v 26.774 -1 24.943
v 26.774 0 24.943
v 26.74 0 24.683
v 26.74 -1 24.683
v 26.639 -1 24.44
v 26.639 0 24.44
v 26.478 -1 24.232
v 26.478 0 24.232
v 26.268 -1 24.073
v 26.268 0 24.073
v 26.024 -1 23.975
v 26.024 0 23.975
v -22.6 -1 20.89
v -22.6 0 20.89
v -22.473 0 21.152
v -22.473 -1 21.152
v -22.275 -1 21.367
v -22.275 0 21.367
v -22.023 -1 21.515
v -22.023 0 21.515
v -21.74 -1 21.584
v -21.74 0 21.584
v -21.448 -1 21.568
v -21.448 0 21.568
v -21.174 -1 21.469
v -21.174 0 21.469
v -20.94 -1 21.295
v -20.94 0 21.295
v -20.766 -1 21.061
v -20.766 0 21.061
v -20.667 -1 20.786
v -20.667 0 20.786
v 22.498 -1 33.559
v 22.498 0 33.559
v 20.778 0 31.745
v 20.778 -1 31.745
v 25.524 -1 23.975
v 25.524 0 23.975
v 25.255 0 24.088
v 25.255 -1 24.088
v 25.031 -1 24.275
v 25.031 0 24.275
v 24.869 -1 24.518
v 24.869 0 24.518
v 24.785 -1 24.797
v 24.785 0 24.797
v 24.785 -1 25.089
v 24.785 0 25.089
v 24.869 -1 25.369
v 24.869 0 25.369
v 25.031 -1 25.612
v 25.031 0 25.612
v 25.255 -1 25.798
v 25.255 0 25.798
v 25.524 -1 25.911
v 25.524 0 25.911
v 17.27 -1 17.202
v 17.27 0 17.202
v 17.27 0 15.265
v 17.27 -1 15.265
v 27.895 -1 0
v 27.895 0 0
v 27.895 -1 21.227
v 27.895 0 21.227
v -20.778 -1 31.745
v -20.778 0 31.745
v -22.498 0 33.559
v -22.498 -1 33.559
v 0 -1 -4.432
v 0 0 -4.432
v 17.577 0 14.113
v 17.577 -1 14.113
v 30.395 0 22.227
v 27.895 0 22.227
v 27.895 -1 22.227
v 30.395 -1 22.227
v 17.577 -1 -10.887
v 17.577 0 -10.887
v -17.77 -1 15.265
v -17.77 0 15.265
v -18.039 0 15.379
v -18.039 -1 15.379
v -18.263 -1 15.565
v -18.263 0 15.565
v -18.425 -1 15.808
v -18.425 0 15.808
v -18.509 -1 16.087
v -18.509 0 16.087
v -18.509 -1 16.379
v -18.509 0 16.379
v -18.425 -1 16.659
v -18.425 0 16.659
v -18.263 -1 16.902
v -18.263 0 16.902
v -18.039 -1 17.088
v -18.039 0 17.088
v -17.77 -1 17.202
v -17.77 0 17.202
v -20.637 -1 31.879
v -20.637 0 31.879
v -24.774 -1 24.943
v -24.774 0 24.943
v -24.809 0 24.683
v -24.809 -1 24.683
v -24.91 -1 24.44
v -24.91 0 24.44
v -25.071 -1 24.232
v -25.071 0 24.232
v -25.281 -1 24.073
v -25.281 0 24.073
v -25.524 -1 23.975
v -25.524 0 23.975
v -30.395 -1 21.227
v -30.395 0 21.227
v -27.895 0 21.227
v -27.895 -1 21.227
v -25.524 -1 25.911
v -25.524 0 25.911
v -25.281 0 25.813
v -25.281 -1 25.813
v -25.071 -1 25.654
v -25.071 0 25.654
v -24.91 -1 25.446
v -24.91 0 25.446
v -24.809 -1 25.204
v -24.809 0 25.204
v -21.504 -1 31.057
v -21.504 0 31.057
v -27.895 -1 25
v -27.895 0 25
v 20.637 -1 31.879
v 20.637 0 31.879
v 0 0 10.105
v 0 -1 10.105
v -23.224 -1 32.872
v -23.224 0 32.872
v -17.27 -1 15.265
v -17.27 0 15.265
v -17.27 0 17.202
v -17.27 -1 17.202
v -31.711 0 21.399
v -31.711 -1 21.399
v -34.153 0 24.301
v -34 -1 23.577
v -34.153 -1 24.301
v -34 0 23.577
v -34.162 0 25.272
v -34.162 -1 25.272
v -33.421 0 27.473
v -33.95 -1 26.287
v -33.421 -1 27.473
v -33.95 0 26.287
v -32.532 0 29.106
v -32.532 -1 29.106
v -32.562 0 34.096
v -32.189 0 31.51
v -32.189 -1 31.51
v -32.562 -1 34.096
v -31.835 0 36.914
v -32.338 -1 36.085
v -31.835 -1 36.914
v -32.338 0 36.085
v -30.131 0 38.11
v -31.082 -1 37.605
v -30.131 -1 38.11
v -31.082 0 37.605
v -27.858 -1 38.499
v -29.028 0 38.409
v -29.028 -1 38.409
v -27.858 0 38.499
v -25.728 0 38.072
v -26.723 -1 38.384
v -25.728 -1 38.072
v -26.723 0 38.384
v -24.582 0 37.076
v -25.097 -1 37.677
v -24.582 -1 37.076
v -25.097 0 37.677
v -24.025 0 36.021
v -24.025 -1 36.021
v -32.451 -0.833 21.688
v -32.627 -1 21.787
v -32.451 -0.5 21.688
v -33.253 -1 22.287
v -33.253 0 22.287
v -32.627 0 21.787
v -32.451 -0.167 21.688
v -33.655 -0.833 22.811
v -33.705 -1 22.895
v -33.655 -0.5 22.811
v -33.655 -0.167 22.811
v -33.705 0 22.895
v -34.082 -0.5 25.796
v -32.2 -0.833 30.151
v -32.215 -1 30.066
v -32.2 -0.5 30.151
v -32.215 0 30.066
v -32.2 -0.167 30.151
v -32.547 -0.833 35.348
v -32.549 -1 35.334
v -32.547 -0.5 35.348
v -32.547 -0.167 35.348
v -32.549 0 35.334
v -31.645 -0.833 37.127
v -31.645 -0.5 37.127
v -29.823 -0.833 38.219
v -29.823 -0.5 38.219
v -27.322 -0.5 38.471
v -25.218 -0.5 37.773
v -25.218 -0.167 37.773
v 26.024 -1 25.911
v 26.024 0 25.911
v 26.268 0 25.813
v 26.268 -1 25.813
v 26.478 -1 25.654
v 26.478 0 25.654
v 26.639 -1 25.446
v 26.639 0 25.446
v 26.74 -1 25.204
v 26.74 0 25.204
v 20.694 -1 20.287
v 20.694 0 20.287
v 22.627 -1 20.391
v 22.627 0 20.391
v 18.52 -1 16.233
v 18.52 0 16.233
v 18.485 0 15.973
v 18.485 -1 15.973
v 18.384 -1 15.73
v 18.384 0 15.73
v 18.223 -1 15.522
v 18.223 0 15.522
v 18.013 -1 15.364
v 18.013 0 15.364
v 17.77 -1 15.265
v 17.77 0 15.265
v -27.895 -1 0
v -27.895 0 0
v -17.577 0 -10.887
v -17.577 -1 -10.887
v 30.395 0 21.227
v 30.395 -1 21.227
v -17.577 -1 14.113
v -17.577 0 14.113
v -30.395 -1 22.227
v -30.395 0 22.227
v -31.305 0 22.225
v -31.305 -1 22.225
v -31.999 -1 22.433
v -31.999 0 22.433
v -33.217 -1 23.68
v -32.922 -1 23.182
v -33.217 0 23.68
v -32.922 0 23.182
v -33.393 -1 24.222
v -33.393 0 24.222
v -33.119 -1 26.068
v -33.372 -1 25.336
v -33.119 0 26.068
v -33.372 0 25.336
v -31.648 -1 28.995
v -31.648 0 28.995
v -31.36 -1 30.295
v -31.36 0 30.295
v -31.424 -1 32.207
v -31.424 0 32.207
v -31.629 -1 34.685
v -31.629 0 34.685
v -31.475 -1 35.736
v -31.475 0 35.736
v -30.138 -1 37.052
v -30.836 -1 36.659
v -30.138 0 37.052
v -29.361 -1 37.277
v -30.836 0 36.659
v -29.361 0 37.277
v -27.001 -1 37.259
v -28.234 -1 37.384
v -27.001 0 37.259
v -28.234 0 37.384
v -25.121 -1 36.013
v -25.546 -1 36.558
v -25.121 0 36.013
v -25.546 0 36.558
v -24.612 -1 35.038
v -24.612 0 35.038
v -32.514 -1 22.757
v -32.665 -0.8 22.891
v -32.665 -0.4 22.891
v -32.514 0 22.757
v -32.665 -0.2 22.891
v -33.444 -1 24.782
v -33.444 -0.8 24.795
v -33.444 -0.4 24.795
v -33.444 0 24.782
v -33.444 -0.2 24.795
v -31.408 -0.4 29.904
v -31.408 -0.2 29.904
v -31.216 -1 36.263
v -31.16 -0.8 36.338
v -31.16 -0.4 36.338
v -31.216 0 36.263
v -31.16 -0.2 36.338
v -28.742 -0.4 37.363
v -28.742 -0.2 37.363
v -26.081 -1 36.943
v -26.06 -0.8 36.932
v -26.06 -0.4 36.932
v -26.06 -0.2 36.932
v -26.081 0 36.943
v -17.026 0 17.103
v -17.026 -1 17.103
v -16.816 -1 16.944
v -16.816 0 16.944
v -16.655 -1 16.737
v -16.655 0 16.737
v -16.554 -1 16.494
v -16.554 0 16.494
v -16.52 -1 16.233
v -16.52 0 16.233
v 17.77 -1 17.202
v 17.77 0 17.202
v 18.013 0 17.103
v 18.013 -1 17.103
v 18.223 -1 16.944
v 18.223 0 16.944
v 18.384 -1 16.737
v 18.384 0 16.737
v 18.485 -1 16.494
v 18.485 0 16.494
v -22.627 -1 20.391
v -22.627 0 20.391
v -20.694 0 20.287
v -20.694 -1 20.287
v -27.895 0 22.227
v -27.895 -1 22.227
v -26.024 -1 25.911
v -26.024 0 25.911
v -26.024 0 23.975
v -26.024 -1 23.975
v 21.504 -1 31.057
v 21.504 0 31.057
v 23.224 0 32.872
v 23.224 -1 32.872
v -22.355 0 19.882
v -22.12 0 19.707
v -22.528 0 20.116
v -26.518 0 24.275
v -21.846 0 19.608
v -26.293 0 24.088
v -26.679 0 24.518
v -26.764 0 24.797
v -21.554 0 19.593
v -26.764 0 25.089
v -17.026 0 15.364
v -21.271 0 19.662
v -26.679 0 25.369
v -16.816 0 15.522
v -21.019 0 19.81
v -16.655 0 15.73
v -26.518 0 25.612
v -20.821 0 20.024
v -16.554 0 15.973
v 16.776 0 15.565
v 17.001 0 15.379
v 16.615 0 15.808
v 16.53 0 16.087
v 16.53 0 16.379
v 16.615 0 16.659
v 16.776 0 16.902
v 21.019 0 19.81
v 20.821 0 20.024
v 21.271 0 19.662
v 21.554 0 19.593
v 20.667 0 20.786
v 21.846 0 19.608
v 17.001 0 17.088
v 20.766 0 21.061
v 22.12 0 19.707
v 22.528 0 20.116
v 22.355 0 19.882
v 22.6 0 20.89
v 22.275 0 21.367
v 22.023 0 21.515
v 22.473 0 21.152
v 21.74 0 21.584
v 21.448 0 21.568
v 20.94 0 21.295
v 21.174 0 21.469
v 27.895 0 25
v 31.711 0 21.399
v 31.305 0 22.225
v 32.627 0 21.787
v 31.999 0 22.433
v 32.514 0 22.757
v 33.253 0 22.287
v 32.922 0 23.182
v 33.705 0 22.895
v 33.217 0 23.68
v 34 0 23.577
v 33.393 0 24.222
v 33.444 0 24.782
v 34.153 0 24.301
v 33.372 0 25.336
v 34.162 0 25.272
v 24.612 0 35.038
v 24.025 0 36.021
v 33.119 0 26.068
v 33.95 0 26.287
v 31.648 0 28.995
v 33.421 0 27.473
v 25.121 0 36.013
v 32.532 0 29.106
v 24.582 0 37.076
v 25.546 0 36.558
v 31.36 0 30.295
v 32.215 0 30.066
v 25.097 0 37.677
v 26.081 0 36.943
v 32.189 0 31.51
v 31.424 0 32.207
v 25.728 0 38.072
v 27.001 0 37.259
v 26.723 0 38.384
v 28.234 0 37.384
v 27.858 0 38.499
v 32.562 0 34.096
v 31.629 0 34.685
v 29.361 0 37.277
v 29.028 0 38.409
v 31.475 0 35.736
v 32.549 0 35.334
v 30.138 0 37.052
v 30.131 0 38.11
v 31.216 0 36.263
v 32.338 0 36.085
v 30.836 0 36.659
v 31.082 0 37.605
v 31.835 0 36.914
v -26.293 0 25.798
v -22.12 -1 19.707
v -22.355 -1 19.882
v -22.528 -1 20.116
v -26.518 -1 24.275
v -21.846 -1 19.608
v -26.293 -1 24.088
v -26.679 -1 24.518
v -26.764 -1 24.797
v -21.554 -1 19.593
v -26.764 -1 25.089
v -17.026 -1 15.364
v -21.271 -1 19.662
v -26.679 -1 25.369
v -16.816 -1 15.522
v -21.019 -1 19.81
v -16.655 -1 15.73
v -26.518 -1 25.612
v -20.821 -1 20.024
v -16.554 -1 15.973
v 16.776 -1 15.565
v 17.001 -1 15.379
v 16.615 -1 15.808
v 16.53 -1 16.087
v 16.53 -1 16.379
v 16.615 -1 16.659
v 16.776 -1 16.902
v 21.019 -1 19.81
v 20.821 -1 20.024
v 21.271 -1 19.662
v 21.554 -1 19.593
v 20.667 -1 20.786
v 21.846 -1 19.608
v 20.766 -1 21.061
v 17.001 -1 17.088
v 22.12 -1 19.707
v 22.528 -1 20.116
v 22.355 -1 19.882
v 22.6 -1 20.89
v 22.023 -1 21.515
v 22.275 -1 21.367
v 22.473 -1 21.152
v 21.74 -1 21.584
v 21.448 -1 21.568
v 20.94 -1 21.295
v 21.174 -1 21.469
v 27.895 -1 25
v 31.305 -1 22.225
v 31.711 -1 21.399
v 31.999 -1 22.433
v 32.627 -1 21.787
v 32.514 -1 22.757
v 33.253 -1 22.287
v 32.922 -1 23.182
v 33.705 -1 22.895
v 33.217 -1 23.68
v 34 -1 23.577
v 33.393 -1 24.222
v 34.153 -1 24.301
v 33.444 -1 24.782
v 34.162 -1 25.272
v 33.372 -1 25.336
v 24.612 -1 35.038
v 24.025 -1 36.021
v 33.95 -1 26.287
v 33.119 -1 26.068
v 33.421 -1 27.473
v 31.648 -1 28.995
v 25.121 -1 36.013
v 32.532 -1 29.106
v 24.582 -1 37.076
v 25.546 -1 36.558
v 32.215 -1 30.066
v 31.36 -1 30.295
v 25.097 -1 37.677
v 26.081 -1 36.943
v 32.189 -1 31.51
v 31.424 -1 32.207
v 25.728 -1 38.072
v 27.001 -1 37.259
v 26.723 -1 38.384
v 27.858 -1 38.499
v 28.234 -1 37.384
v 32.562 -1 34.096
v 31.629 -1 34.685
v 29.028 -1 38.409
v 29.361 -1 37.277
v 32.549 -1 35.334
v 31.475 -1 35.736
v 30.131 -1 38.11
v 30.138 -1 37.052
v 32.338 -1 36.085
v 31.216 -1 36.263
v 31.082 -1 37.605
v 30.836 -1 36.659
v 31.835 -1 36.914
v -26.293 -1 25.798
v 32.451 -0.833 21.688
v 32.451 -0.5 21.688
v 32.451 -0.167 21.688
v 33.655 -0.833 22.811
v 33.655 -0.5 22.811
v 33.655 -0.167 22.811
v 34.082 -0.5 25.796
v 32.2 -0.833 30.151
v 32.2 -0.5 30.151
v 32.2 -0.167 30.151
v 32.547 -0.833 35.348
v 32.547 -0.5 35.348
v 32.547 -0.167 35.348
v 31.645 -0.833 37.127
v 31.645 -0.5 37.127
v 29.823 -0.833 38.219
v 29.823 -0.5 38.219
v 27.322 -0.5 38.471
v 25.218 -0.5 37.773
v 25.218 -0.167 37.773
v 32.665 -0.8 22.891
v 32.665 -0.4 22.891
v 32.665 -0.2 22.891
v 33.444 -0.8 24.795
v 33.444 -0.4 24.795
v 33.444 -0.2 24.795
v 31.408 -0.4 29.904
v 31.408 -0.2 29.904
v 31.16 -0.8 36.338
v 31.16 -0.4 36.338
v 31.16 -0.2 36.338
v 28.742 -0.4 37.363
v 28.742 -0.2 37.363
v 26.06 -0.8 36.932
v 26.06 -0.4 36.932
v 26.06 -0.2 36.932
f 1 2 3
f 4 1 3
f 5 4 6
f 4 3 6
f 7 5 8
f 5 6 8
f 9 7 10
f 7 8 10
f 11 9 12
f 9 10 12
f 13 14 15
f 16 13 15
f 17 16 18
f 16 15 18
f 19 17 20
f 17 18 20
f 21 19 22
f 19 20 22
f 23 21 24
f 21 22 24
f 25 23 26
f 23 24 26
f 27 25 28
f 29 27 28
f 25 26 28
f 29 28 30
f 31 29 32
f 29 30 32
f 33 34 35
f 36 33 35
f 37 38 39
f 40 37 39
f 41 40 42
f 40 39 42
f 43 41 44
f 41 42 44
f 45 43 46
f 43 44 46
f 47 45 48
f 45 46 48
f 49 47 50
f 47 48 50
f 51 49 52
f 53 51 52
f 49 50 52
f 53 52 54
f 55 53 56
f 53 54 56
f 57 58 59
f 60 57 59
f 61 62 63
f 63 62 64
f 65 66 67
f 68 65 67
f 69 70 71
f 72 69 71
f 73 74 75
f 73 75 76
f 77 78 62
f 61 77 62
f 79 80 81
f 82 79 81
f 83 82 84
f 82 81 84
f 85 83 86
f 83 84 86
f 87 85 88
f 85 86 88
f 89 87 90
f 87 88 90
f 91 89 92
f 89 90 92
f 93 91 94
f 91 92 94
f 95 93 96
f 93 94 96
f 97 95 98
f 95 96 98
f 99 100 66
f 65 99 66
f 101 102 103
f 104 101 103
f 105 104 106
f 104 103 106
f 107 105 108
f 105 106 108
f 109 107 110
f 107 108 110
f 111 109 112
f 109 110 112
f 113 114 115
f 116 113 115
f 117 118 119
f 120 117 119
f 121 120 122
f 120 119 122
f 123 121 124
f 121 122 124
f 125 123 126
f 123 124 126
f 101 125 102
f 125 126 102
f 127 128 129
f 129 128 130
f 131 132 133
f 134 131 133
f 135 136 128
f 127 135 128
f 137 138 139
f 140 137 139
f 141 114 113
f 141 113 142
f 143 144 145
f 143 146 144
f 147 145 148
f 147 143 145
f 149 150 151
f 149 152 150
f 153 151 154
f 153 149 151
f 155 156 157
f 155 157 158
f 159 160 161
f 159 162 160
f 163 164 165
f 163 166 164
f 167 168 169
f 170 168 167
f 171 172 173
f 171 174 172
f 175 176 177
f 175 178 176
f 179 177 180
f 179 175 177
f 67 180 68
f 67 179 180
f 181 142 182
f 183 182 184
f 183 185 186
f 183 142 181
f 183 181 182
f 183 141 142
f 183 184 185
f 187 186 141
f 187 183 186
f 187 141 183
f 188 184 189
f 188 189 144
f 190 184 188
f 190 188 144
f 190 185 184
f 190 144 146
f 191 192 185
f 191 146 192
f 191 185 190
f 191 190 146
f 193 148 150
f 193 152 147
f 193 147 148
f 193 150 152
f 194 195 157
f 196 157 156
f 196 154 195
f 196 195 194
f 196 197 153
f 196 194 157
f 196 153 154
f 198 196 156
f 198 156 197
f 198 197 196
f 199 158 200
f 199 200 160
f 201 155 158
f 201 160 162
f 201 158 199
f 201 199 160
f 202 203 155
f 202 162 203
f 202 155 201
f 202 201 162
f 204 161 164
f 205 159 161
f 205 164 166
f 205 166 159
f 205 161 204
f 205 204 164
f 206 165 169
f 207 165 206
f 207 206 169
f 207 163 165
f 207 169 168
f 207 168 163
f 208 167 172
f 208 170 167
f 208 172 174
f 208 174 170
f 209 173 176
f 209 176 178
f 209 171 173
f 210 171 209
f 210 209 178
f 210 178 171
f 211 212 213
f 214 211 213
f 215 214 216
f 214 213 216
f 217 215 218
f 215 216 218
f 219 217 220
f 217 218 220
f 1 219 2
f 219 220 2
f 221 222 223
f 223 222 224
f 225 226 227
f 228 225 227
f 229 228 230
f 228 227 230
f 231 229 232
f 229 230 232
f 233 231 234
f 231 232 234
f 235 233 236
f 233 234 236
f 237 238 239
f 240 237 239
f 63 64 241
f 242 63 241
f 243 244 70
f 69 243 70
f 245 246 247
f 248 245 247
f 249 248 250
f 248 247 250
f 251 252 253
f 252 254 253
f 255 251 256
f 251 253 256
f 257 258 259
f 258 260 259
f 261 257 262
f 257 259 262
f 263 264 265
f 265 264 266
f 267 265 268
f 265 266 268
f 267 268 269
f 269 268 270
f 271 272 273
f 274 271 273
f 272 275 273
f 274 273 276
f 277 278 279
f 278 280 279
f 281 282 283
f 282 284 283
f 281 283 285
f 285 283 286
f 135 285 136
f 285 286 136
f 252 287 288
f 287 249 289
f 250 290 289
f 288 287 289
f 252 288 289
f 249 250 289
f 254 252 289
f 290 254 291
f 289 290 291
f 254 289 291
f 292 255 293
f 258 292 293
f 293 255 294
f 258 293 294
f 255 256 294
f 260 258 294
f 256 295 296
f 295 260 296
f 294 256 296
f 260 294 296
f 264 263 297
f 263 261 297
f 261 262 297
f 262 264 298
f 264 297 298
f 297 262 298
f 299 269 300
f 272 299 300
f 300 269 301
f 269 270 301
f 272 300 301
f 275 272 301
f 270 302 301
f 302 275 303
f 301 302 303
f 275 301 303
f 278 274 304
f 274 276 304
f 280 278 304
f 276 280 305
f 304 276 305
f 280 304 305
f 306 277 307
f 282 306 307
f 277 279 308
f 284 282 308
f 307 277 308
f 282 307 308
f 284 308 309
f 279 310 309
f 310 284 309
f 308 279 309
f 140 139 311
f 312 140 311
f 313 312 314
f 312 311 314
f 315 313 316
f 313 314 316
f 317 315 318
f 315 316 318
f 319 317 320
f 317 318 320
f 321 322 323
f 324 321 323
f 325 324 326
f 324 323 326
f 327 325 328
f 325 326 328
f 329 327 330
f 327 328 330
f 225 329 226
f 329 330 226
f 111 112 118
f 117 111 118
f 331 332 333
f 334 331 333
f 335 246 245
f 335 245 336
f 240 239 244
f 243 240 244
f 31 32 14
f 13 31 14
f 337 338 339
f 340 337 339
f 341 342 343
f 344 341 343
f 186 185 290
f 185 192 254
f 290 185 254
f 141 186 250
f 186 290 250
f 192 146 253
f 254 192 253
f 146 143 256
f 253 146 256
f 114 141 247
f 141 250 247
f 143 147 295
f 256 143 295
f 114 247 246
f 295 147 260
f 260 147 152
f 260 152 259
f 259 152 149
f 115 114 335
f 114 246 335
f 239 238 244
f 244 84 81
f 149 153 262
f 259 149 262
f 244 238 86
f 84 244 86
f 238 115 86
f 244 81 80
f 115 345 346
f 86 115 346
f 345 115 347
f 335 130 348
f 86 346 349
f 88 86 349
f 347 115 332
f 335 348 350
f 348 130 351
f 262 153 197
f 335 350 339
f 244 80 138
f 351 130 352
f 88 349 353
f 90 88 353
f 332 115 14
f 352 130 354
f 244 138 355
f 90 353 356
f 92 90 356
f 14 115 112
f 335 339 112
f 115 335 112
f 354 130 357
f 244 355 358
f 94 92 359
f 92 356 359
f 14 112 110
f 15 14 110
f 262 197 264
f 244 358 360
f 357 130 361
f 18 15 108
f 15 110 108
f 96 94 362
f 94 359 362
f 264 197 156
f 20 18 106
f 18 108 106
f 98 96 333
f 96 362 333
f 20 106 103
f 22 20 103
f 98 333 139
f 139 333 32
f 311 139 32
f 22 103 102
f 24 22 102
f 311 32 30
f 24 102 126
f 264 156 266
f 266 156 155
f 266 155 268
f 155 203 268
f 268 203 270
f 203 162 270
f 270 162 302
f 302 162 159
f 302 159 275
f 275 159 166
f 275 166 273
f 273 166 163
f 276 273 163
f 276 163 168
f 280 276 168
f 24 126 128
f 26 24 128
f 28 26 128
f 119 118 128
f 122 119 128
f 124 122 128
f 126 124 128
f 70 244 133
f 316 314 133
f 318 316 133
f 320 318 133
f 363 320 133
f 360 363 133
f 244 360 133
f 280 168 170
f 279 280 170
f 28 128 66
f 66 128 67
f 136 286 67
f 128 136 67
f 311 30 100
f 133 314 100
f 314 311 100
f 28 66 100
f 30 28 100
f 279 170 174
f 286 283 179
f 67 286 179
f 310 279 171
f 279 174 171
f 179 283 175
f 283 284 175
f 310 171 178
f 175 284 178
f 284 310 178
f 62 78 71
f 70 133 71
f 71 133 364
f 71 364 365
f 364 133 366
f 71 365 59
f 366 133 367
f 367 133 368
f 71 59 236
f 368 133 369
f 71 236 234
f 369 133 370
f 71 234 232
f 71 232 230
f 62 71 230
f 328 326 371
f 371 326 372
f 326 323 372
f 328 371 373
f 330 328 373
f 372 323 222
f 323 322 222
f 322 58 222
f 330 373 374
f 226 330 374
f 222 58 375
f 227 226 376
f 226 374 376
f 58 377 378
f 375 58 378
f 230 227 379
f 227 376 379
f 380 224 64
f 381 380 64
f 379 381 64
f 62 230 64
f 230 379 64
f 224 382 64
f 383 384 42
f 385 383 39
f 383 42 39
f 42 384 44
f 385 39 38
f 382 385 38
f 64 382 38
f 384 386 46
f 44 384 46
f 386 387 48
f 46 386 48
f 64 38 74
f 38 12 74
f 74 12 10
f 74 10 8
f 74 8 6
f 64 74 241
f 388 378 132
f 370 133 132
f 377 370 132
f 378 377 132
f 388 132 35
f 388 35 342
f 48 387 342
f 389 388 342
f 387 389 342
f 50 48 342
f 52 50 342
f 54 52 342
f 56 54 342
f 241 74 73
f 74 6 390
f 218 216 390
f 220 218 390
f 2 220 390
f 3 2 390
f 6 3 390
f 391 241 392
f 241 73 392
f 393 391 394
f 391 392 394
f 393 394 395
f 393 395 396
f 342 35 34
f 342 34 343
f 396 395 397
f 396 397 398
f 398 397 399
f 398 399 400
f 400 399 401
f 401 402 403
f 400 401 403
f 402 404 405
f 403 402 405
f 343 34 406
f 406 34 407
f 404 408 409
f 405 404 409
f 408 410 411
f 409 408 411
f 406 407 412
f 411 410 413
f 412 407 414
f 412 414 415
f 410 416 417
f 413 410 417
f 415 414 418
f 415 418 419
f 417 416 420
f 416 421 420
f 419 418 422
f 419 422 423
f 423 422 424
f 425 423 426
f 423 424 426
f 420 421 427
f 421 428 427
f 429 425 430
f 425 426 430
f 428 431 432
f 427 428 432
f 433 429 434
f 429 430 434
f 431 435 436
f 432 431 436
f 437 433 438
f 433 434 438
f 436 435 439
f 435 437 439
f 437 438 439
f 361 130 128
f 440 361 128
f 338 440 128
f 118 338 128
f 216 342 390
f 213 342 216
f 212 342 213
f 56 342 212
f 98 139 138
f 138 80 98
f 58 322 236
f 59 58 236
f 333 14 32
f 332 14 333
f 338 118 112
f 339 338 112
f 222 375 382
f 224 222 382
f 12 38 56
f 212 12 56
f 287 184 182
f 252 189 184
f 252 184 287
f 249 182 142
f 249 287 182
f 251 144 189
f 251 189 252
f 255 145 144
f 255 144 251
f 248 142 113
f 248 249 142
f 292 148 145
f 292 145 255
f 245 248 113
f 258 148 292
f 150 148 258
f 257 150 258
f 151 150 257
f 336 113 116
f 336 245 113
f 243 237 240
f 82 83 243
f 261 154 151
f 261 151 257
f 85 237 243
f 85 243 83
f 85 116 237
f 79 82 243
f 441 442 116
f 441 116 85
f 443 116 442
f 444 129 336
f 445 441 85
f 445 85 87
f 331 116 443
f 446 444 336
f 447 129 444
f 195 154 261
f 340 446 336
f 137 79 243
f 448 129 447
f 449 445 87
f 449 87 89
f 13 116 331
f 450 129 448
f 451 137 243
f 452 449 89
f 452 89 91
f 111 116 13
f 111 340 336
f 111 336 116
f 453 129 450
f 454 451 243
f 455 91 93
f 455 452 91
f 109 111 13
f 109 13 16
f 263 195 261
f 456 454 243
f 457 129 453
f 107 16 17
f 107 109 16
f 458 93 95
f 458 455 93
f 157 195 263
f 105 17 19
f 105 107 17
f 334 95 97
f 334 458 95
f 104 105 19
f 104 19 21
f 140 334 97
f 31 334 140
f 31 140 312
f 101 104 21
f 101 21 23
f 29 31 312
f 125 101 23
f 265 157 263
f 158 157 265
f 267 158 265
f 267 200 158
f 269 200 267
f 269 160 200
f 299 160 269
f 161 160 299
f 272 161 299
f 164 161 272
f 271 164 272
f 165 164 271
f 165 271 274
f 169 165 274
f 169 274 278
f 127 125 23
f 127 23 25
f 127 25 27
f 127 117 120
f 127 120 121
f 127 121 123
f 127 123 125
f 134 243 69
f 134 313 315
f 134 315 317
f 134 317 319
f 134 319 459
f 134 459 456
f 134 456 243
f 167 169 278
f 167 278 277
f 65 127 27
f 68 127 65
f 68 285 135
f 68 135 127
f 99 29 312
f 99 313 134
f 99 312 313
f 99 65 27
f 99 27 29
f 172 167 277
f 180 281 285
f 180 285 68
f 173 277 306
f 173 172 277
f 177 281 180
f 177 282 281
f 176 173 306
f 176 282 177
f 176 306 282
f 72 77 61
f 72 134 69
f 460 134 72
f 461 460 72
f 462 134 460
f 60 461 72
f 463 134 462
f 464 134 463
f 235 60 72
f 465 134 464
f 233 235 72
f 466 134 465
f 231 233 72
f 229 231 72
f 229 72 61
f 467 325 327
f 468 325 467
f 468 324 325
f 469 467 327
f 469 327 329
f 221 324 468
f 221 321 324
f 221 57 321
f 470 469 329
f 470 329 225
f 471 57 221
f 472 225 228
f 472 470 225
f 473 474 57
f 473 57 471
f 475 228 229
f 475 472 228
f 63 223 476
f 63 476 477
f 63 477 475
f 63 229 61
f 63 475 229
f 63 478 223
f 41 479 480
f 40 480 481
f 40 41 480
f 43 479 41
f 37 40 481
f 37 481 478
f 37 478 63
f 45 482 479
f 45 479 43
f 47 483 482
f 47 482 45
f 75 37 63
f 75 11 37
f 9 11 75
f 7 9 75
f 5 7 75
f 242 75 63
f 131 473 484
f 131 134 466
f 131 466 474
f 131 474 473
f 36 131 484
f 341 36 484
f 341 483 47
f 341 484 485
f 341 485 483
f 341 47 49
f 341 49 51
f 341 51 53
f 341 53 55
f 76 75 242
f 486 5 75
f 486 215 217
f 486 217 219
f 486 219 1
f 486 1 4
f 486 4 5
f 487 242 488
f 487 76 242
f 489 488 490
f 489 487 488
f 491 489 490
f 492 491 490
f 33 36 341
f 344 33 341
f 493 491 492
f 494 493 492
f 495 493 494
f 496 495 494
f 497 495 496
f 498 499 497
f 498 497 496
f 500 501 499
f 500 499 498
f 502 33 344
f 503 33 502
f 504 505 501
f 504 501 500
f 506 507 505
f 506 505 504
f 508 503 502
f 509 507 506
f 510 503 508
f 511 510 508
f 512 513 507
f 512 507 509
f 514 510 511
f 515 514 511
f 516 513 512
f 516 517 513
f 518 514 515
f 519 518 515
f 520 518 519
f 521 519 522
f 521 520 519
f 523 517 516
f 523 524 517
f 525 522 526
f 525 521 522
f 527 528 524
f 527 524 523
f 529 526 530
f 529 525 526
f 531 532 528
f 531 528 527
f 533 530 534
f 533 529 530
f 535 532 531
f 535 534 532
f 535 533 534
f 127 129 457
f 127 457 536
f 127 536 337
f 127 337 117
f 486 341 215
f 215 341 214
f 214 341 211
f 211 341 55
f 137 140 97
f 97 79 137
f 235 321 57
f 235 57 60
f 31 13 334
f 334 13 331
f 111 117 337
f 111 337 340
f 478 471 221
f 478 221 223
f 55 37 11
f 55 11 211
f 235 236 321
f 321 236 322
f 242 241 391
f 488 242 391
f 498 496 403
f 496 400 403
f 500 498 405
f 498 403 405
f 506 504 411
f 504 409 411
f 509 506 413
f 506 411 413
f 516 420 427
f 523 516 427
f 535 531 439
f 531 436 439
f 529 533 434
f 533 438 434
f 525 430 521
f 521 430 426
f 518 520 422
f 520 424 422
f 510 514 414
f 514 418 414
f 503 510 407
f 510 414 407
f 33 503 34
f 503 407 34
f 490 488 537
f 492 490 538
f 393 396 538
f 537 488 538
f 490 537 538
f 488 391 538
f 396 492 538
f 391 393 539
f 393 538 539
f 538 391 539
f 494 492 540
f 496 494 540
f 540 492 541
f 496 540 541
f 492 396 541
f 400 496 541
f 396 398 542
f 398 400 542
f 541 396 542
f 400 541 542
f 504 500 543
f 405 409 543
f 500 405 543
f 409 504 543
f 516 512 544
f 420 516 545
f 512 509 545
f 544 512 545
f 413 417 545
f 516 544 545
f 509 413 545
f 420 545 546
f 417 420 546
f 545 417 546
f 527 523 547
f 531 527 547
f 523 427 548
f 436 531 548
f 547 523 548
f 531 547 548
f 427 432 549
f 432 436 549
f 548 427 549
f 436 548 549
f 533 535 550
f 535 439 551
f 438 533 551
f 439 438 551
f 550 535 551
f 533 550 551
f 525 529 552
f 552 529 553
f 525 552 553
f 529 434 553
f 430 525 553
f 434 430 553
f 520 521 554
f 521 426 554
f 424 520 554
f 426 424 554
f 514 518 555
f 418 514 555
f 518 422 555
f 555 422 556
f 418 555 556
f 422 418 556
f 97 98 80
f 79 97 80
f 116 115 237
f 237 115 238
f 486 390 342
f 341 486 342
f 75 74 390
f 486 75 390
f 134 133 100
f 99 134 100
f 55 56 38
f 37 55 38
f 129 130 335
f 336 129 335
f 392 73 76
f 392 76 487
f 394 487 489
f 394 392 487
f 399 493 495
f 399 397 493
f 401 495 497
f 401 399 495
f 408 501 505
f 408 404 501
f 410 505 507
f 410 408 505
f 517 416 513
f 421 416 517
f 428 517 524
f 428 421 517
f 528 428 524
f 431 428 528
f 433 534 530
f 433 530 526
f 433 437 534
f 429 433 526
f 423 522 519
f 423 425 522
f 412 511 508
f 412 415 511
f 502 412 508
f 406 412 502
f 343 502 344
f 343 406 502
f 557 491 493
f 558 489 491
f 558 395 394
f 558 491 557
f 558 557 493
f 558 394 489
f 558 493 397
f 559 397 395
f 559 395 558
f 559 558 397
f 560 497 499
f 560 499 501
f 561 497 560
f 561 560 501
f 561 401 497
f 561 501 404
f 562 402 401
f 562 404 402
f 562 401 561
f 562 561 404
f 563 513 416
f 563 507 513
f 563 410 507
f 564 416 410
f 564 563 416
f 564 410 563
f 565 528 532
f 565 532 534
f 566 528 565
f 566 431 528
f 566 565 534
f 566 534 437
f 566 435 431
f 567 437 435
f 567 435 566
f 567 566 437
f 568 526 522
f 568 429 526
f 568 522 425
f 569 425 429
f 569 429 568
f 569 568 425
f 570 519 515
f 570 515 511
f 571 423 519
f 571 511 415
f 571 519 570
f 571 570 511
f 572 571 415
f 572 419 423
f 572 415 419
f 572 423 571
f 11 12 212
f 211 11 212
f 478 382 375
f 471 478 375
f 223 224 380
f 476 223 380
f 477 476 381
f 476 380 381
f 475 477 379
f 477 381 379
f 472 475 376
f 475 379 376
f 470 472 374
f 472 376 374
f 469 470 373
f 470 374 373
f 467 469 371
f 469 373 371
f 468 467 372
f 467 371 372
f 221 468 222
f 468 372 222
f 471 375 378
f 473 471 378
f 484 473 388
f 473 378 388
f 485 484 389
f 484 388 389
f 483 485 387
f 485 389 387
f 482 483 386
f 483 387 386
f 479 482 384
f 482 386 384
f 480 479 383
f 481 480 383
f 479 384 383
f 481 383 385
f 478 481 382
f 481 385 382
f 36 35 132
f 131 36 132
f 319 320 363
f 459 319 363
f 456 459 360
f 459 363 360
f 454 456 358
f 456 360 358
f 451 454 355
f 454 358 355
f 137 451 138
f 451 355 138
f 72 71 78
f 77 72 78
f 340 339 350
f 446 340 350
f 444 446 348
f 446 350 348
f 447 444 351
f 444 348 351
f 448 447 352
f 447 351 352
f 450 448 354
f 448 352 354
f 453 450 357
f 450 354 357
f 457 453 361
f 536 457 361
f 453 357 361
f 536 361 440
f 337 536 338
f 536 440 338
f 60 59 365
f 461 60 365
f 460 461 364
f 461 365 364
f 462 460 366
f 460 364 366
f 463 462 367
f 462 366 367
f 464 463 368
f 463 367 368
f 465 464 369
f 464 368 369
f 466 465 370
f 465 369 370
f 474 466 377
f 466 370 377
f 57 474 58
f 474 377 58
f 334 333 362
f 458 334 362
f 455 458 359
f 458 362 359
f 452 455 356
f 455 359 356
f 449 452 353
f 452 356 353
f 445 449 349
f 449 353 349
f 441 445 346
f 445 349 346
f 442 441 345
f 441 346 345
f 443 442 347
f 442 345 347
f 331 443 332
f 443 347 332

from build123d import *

# Parameters (mm, degrees)
F0_W     = 2.5
F0_H     = 1
F1_DEPTH = 1


with BuildPart() as f1:
    # F0 (on Front) → F1 (new body)
    with BuildSketch(Plane.XZ):
        Polygon((-21.5041256621, 31.0570161438), (-27.8949729542, 25), (-17.5765327521, 14.1128611749), (0, -4.4323984176), (17.5765327521, 14.1128611749), (27.8949729542, 25), (21.5041256621, 31.0570161438), (20.7783164071, 31.7449121572), (20.6368804041, 31.8789601347), (0, 10.1046824845), (-20.6368804041, 31.8789601347), (-20.7783164071, 31.7449121572), align=None)
        with BuildLine():
            ThreePointArc((-20.6667853668, 20.7860190692), (-20.6519878152, 20.6876385753), (-20.6470389706, 20.5882746076))
            ThreePointArc((-20.6470389706, 20.5882746076), (-20.6587438403, 20.4357205667), (-20.6935844414, 20.2867377762))
            ThreePointArc((-20.6935844414, 20.2867377762), (-21.7006371199, 19.5897120215), (-22.6272925745, 20.390530146))
            ThreePointArc((-22.6272925745, 20.390530146), (-22.6456015568, 20.6418727569), (-22.6004934999, 20.8898114391))
            ThreePointArc((-22.6004934999, 20.8898114391), (-21.5934408213, 21.5868371938), (-20.6667853668, 20.7860190692))
        make_face(mode=Mode.SUBTRACT)
        with BuildLine():
            ThreePointArc((-25.5244150514, 25.9113759742), (-24.9838456364, 25.5555025734), (-24.7744150515, 24.9431301377))
            ThreePointArc((-24.7744150515, 24.9431301377), (-24.9838456364, 24.330757702), (-25.5244150514, 23.9748843011))
            ThreePointArc((-25.5244150514, 23.9748843011), (-25.7744150514, 23.9431301377), (-26.0244150514, 23.9748843011))
            ThreePointArc((-26.0244150514, 23.9748843011), (-26.7744150515, 24.9431301377), (-26.0244150514, 25.9113759742))
            ThreePointArc((-26.0244150514, 25.9113759742), (-25.7744150514, 25.9431301377), (-25.5244150514, 25.9113759742))
        make_face(mode=Mode.SUBTRACT)
        with BuildLine():
            ThreePointArc((-17.2696628899, 17.2016649142), (-16.7290934748, 16.8457915133), (-16.5196628898, 16.2334190776))
            ThreePointArc((-16.5196628898, 16.2334190776), (-16.7290934748, 15.6210466419), (-17.2696628898, 15.265173241))
            ThreePointArc((-17.2696628898, 15.265173241), (-17.5196628899, 15.2334190776), (-17.7696628899, 15.2651732411))
            ThreePointArc((-17.7696628899, 15.2651732411), (-18.5196628898, 16.2334190776), (-17.7696628898, 17.2016649141))
            ThreePointArc((-17.7696628898, 17.2016649141), (-17.5196628898, 17.2334190776), (-17.2696628899, 17.2016649142))
        make_face(mode=Mode.SUBTRACT)
        with BuildLine():
            ThreePointArc((17.7696628898, 17.2016649141), (18.3102323049, 16.8457915133), (18.5196628898, 16.2334190776))
            ThreePointArc((18.5196628898, 16.2334190776), (18.3102323049, 15.6210466419), (17.7696628899, 15.2651732411))
            ThreePointArc((17.7696628899, 15.2651732411), (17.5196628899, 15.2334190776), (17.2696628898, 15.265173241))
            ThreePointArc((17.2696628898, 15.265173241), (16.5196628898, 16.2334190776), (17.2696628899, 17.2016649142))
            ThreePointArc((17.2696628899, 17.2016649142), (17.5196628898, 17.2334190776), (17.7696628898, 17.2016649141))
        make_face(mode=Mode.SUBTRACT)
        with BuildLine():
            ThreePointArc((22.6004934999, 20.8898114391), (22.635334101, 20.7408286485), (22.6470389706, 20.5882746076))
            ThreePointArc((22.6470389706, 20.5882746076), (22.6420901261, 20.48891064), (22.6272925745, 20.390530146))
            ThreePointArc((22.6272925745, 20.390530146), (21.7006371199, 19.5897120215), (20.6935844414, 20.2867377762))
            ThreePointArc((20.6935844414, 20.2867377762), (20.6484763845, 20.5346764583), (20.6667853668, 20.7860190692))
            ThreePointArc((20.6667853668, 20.7860190692), (21.5934408213, 21.5868371938), (22.6004934999, 20.8898114391))
        make_face(mode=Mode.SUBTRACT)
        with BuildLine():
            ThreePointArc((25.5244150514, 25.9113759742), (25.7744150514, 25.9431301377), (26.0244150514, 25.9113759742))
            ThreePointArc((26.0244150514, 25.9113759742), (26.5649844665, 25.5555025734), (26.7744150515, 24.9431301377))
            ThreePointArc((26.7744150515, 24.9431301377), (26.5649844665, 24.330757702), (26.0244150514, 23.9748843011))
            ThreePointArc((26.0244150514, 23.9748843011), (25.7744150514, 23.9431301377), (25.5244150514, 23.9748843011))
            ThreePointArc((25.5244150514, 23.9748843011), (24.7744150515, 24.9431301377), (25.5244150514, 25.9113759742))
        make_face(mode=Mode.SUBTRACT)
        with BuildLine():
            ThreePointArc((-20.6935844414, 20.2867377762), (-20.6587438403, 20.4357205667), (-20.6470389706, 20.5882746076))
            ThreePointArc((-20.6470389706, 20.5882746076), (-20.6519878152, 20.6876385753), (-20.6667853668, 20.7860190692))
            Line((-20.6667853668, 20.7860190692), (-22.6004934998, 20.8898114391))
            ThreePointArc((-22.6004934999, 20.8898114391), (-22.6456015568, 20.6418727569), (-22.6272925745, 20.390530146))
            Line((-22.6272925745, 20.390530146), (-20.6935844414, 20.2867377762))
        make_face()
        with BuildLine():
            Line((-17.2696628899, 15.2651732411), (-17.2696628899, 17.2016649142))
            ThreePointArc((-17.2696628899, 17.2016649142), (-17.5196628898, 17.2334190776), (-17.7696628898, 17.2016649141))
            Line((-17.7696628899, 17.2016649142), (-17.7696628899, 15.2651732411))
            ThreePointArc((-17.7696628899, 15.2651732411), (-17.5196628899, 15.2334190776), (-17.2696628898, 15.265173241))
        make_face()
        with BuildLine():
            Line((-25.5244150514, 23.9748843011), (-25.5244150514, 25.9113759742))
            ThreePointArc((-25.5244150514, 25.9113759742), (-25.7744150514, 25.9431301377), (-26.0244150514, 25.9113759742))
            Line((-26.0244150514, 25.9113759742), (-26.0244150514, 23.9748843011))
            ThreePointArc((-26.0244150514, 23.9748843011), (-25.7744150514, 23.9431301377), (-25.5244150514, 23.9748843011))
        make_face()
        with BuildLine():
            Line((17.7696628899, 15.2651732411), (17.7696628899, 17.2016649142))
            ThreePointArc((17.7696628898, 17.2016649141), (17.5196628898, 17.2334190776), (17.2696628899, 17.2016649142))
            Line((17.2696628899, 17.2016649142), (17.2696628899, 15.2651732411))
            ThreePointArc((17.2696628898, 15.265173241), (17.5196628899, 15.2334190776), (17.7696628899, 15.2651732411))
        make_face()
        with BuildLine():
            ThreePointArc((22.6272925745, 20.390530146), (22.6420901261, 20.48891064), (22.6470389706, 20.5882746076))
            ThreePointArc((22.6470389706, 20.5882746076), (22.635334101, 20.7408286485), (22.6004934999, 20.8898114391))
            Line((22.6004934998, 20.8898114391), (20.6667853668, 20.7860190692))
            ThreePointArc((20.6667853668, 20.7860190692), (20.6484763845, 20.5346764583), (20.6935844414, 20.2867377762))
            Line((20.6935844414, 20.2867377762), (22.6272925745, 20.390530146))
        make_face()
        with BuildLine():
            Line((26.0244150514, 23.9748843011), (26.0244150514, 25.9113759742))
            ThreePointArc((26.0244150514, 25.9113759742), (25.7744150514, 25.9431301377), (25.5244150514, 25.9113759742))
            Line((25.5244150514, 25.9113759742), (25.5244150514, 23.9748843011))
            ThreePointArc((25.5244150514, 23.9748843011), (25.7744150514, 23.9431301377), (26.0244150514, 23.9748843011))
        make_face()
        with BuildLine():
            add(Edge.make_bspline(
                [(-30.3949729542, 22.2266743183), (-32.3459120476, 21.9464057728), (-34.814820051, 25.1569130987), (-29.9406562875, 29.4624113714), (-33.3229612403, 37.5029221755), (-24.6348075097, 37.699224987), (-24.8789525053, 34.8056361785), (-23.2238656958, 32.8715392813)],
                knots=[0, 0, 0, 0, 0.175592168, 0.3818384458, 0.6049955425, 0.8042805633, 1, 1, 1, 1], degree=3))
            Line((-23.2238656958, 32.8715392813), (-22.4980564408, 33.5594352948))
            add(Edge.make_bspline(
                [(-30.3949729542, 21.2266743183), (-33.769396033, 21.2623445922), (-35.1304093787, 26.256700748), (-31.1198421968, 29.8097298229), (-33.5455166511, 35.5363763005), (-30.1206826208, 38.8775311144), (-24.1579853587, 38.3605596931), (-24.126560546, 35.5280691092), (-22.4980564408, 33.5594352948)],
                knots=[0, 0, 0, 0, 0.1826946464, 0.3469217666, 0.5189889886, 0.6689693608, 0.8311464613, 1, 1, 1, 1], degree=3))
            Line((-30.3949729542, 21.2266743183), (-30.3949729542, 22.2266743183))
        make_face()
        Polygon((-23.2238656958, 32.8715392813), (-21.5041256621, 31.0570161438), (-20.7783164071, 31.7449121572), (-22.4980564408, 33.5594352948), align=None)
        with Locations((-29.1449729542, 21.7266743183)):
            Rectangle(F0_W, F0_H)
        Polygon((-17.5765327521, 14.1128611749), (-27.8949729541, 25), (-27.8949729542, 22.2266743183), (-27.8949729542, 21.2266743183), (-27.8949729542, 0), (-17.5765327521, -10.8871388251), align=None)
        Polygon((27.8949729542, 25), (17.5765327521, 14.1128611749), (17.5765327521, -10.8871388251), (27.8949729542, 0), (27.8949729542, 21.2266743183), (27.8949729542, 22.2266743183), align=None)
        with BuildLine():
            Line((22.4980564408, 33.5594352948), (23.2238656958, 32.8715392813))
            add(Edge.make_bspline(
                [(30.3949729542, 22.2266743183), (32.3459120476, 21.9464057728), (34.814820051, 25.1569130987), (29.9406562875, 29.4624113714), (33.3229612403, 37.5029221755), (24.6348075097, 37.699224987), (24.8789525053, 34.8056361785), (23.2238656958, 32.8715392813)],
                knots=[0, 0, 0, 0, 0.175592168, 0.3818384458, 0.6049955425, 0.8042805633, 1, 1, 1, 1], degree=3))
            Line((30.3949729542, 22.2266743183), (30.3949729542, 21.2266743183))
            add(Edge.make_bspline(
                [(30.3949729542, 21.2266743183), (33.769396033, 21.2623445922), (35.1304093787, 26.256700748), (31.1198421968, 29.8097298229), (33.5455166511, 35.5363763005), (30.1206826208, 38.8775311144), (24.1579853587, 38.3605596931), (24.126560546, 35.5280691092), (22.4980564408, 33.5594352948)],
                knots=[0, 0, 0, 0, 0.1826946464, 0.3469217666, 0.5189889886, 0.6689693608, 0.8311464613, 1, 1, 1, 1], degree=3))
        make_face()
        with Locations((29.1449729542, 21.7266743183)):
            Rectangle(F0_W, F0_H)
        Polygon((20.7783164071, 31.7449121572), (21.5041256621, 31.0570161438), (23.2238656958, 32.8715392813), (22.4980564408, 33.5594352948), align=None)
    extrude(amount=F1_DEPTH)


solid = f1.part
